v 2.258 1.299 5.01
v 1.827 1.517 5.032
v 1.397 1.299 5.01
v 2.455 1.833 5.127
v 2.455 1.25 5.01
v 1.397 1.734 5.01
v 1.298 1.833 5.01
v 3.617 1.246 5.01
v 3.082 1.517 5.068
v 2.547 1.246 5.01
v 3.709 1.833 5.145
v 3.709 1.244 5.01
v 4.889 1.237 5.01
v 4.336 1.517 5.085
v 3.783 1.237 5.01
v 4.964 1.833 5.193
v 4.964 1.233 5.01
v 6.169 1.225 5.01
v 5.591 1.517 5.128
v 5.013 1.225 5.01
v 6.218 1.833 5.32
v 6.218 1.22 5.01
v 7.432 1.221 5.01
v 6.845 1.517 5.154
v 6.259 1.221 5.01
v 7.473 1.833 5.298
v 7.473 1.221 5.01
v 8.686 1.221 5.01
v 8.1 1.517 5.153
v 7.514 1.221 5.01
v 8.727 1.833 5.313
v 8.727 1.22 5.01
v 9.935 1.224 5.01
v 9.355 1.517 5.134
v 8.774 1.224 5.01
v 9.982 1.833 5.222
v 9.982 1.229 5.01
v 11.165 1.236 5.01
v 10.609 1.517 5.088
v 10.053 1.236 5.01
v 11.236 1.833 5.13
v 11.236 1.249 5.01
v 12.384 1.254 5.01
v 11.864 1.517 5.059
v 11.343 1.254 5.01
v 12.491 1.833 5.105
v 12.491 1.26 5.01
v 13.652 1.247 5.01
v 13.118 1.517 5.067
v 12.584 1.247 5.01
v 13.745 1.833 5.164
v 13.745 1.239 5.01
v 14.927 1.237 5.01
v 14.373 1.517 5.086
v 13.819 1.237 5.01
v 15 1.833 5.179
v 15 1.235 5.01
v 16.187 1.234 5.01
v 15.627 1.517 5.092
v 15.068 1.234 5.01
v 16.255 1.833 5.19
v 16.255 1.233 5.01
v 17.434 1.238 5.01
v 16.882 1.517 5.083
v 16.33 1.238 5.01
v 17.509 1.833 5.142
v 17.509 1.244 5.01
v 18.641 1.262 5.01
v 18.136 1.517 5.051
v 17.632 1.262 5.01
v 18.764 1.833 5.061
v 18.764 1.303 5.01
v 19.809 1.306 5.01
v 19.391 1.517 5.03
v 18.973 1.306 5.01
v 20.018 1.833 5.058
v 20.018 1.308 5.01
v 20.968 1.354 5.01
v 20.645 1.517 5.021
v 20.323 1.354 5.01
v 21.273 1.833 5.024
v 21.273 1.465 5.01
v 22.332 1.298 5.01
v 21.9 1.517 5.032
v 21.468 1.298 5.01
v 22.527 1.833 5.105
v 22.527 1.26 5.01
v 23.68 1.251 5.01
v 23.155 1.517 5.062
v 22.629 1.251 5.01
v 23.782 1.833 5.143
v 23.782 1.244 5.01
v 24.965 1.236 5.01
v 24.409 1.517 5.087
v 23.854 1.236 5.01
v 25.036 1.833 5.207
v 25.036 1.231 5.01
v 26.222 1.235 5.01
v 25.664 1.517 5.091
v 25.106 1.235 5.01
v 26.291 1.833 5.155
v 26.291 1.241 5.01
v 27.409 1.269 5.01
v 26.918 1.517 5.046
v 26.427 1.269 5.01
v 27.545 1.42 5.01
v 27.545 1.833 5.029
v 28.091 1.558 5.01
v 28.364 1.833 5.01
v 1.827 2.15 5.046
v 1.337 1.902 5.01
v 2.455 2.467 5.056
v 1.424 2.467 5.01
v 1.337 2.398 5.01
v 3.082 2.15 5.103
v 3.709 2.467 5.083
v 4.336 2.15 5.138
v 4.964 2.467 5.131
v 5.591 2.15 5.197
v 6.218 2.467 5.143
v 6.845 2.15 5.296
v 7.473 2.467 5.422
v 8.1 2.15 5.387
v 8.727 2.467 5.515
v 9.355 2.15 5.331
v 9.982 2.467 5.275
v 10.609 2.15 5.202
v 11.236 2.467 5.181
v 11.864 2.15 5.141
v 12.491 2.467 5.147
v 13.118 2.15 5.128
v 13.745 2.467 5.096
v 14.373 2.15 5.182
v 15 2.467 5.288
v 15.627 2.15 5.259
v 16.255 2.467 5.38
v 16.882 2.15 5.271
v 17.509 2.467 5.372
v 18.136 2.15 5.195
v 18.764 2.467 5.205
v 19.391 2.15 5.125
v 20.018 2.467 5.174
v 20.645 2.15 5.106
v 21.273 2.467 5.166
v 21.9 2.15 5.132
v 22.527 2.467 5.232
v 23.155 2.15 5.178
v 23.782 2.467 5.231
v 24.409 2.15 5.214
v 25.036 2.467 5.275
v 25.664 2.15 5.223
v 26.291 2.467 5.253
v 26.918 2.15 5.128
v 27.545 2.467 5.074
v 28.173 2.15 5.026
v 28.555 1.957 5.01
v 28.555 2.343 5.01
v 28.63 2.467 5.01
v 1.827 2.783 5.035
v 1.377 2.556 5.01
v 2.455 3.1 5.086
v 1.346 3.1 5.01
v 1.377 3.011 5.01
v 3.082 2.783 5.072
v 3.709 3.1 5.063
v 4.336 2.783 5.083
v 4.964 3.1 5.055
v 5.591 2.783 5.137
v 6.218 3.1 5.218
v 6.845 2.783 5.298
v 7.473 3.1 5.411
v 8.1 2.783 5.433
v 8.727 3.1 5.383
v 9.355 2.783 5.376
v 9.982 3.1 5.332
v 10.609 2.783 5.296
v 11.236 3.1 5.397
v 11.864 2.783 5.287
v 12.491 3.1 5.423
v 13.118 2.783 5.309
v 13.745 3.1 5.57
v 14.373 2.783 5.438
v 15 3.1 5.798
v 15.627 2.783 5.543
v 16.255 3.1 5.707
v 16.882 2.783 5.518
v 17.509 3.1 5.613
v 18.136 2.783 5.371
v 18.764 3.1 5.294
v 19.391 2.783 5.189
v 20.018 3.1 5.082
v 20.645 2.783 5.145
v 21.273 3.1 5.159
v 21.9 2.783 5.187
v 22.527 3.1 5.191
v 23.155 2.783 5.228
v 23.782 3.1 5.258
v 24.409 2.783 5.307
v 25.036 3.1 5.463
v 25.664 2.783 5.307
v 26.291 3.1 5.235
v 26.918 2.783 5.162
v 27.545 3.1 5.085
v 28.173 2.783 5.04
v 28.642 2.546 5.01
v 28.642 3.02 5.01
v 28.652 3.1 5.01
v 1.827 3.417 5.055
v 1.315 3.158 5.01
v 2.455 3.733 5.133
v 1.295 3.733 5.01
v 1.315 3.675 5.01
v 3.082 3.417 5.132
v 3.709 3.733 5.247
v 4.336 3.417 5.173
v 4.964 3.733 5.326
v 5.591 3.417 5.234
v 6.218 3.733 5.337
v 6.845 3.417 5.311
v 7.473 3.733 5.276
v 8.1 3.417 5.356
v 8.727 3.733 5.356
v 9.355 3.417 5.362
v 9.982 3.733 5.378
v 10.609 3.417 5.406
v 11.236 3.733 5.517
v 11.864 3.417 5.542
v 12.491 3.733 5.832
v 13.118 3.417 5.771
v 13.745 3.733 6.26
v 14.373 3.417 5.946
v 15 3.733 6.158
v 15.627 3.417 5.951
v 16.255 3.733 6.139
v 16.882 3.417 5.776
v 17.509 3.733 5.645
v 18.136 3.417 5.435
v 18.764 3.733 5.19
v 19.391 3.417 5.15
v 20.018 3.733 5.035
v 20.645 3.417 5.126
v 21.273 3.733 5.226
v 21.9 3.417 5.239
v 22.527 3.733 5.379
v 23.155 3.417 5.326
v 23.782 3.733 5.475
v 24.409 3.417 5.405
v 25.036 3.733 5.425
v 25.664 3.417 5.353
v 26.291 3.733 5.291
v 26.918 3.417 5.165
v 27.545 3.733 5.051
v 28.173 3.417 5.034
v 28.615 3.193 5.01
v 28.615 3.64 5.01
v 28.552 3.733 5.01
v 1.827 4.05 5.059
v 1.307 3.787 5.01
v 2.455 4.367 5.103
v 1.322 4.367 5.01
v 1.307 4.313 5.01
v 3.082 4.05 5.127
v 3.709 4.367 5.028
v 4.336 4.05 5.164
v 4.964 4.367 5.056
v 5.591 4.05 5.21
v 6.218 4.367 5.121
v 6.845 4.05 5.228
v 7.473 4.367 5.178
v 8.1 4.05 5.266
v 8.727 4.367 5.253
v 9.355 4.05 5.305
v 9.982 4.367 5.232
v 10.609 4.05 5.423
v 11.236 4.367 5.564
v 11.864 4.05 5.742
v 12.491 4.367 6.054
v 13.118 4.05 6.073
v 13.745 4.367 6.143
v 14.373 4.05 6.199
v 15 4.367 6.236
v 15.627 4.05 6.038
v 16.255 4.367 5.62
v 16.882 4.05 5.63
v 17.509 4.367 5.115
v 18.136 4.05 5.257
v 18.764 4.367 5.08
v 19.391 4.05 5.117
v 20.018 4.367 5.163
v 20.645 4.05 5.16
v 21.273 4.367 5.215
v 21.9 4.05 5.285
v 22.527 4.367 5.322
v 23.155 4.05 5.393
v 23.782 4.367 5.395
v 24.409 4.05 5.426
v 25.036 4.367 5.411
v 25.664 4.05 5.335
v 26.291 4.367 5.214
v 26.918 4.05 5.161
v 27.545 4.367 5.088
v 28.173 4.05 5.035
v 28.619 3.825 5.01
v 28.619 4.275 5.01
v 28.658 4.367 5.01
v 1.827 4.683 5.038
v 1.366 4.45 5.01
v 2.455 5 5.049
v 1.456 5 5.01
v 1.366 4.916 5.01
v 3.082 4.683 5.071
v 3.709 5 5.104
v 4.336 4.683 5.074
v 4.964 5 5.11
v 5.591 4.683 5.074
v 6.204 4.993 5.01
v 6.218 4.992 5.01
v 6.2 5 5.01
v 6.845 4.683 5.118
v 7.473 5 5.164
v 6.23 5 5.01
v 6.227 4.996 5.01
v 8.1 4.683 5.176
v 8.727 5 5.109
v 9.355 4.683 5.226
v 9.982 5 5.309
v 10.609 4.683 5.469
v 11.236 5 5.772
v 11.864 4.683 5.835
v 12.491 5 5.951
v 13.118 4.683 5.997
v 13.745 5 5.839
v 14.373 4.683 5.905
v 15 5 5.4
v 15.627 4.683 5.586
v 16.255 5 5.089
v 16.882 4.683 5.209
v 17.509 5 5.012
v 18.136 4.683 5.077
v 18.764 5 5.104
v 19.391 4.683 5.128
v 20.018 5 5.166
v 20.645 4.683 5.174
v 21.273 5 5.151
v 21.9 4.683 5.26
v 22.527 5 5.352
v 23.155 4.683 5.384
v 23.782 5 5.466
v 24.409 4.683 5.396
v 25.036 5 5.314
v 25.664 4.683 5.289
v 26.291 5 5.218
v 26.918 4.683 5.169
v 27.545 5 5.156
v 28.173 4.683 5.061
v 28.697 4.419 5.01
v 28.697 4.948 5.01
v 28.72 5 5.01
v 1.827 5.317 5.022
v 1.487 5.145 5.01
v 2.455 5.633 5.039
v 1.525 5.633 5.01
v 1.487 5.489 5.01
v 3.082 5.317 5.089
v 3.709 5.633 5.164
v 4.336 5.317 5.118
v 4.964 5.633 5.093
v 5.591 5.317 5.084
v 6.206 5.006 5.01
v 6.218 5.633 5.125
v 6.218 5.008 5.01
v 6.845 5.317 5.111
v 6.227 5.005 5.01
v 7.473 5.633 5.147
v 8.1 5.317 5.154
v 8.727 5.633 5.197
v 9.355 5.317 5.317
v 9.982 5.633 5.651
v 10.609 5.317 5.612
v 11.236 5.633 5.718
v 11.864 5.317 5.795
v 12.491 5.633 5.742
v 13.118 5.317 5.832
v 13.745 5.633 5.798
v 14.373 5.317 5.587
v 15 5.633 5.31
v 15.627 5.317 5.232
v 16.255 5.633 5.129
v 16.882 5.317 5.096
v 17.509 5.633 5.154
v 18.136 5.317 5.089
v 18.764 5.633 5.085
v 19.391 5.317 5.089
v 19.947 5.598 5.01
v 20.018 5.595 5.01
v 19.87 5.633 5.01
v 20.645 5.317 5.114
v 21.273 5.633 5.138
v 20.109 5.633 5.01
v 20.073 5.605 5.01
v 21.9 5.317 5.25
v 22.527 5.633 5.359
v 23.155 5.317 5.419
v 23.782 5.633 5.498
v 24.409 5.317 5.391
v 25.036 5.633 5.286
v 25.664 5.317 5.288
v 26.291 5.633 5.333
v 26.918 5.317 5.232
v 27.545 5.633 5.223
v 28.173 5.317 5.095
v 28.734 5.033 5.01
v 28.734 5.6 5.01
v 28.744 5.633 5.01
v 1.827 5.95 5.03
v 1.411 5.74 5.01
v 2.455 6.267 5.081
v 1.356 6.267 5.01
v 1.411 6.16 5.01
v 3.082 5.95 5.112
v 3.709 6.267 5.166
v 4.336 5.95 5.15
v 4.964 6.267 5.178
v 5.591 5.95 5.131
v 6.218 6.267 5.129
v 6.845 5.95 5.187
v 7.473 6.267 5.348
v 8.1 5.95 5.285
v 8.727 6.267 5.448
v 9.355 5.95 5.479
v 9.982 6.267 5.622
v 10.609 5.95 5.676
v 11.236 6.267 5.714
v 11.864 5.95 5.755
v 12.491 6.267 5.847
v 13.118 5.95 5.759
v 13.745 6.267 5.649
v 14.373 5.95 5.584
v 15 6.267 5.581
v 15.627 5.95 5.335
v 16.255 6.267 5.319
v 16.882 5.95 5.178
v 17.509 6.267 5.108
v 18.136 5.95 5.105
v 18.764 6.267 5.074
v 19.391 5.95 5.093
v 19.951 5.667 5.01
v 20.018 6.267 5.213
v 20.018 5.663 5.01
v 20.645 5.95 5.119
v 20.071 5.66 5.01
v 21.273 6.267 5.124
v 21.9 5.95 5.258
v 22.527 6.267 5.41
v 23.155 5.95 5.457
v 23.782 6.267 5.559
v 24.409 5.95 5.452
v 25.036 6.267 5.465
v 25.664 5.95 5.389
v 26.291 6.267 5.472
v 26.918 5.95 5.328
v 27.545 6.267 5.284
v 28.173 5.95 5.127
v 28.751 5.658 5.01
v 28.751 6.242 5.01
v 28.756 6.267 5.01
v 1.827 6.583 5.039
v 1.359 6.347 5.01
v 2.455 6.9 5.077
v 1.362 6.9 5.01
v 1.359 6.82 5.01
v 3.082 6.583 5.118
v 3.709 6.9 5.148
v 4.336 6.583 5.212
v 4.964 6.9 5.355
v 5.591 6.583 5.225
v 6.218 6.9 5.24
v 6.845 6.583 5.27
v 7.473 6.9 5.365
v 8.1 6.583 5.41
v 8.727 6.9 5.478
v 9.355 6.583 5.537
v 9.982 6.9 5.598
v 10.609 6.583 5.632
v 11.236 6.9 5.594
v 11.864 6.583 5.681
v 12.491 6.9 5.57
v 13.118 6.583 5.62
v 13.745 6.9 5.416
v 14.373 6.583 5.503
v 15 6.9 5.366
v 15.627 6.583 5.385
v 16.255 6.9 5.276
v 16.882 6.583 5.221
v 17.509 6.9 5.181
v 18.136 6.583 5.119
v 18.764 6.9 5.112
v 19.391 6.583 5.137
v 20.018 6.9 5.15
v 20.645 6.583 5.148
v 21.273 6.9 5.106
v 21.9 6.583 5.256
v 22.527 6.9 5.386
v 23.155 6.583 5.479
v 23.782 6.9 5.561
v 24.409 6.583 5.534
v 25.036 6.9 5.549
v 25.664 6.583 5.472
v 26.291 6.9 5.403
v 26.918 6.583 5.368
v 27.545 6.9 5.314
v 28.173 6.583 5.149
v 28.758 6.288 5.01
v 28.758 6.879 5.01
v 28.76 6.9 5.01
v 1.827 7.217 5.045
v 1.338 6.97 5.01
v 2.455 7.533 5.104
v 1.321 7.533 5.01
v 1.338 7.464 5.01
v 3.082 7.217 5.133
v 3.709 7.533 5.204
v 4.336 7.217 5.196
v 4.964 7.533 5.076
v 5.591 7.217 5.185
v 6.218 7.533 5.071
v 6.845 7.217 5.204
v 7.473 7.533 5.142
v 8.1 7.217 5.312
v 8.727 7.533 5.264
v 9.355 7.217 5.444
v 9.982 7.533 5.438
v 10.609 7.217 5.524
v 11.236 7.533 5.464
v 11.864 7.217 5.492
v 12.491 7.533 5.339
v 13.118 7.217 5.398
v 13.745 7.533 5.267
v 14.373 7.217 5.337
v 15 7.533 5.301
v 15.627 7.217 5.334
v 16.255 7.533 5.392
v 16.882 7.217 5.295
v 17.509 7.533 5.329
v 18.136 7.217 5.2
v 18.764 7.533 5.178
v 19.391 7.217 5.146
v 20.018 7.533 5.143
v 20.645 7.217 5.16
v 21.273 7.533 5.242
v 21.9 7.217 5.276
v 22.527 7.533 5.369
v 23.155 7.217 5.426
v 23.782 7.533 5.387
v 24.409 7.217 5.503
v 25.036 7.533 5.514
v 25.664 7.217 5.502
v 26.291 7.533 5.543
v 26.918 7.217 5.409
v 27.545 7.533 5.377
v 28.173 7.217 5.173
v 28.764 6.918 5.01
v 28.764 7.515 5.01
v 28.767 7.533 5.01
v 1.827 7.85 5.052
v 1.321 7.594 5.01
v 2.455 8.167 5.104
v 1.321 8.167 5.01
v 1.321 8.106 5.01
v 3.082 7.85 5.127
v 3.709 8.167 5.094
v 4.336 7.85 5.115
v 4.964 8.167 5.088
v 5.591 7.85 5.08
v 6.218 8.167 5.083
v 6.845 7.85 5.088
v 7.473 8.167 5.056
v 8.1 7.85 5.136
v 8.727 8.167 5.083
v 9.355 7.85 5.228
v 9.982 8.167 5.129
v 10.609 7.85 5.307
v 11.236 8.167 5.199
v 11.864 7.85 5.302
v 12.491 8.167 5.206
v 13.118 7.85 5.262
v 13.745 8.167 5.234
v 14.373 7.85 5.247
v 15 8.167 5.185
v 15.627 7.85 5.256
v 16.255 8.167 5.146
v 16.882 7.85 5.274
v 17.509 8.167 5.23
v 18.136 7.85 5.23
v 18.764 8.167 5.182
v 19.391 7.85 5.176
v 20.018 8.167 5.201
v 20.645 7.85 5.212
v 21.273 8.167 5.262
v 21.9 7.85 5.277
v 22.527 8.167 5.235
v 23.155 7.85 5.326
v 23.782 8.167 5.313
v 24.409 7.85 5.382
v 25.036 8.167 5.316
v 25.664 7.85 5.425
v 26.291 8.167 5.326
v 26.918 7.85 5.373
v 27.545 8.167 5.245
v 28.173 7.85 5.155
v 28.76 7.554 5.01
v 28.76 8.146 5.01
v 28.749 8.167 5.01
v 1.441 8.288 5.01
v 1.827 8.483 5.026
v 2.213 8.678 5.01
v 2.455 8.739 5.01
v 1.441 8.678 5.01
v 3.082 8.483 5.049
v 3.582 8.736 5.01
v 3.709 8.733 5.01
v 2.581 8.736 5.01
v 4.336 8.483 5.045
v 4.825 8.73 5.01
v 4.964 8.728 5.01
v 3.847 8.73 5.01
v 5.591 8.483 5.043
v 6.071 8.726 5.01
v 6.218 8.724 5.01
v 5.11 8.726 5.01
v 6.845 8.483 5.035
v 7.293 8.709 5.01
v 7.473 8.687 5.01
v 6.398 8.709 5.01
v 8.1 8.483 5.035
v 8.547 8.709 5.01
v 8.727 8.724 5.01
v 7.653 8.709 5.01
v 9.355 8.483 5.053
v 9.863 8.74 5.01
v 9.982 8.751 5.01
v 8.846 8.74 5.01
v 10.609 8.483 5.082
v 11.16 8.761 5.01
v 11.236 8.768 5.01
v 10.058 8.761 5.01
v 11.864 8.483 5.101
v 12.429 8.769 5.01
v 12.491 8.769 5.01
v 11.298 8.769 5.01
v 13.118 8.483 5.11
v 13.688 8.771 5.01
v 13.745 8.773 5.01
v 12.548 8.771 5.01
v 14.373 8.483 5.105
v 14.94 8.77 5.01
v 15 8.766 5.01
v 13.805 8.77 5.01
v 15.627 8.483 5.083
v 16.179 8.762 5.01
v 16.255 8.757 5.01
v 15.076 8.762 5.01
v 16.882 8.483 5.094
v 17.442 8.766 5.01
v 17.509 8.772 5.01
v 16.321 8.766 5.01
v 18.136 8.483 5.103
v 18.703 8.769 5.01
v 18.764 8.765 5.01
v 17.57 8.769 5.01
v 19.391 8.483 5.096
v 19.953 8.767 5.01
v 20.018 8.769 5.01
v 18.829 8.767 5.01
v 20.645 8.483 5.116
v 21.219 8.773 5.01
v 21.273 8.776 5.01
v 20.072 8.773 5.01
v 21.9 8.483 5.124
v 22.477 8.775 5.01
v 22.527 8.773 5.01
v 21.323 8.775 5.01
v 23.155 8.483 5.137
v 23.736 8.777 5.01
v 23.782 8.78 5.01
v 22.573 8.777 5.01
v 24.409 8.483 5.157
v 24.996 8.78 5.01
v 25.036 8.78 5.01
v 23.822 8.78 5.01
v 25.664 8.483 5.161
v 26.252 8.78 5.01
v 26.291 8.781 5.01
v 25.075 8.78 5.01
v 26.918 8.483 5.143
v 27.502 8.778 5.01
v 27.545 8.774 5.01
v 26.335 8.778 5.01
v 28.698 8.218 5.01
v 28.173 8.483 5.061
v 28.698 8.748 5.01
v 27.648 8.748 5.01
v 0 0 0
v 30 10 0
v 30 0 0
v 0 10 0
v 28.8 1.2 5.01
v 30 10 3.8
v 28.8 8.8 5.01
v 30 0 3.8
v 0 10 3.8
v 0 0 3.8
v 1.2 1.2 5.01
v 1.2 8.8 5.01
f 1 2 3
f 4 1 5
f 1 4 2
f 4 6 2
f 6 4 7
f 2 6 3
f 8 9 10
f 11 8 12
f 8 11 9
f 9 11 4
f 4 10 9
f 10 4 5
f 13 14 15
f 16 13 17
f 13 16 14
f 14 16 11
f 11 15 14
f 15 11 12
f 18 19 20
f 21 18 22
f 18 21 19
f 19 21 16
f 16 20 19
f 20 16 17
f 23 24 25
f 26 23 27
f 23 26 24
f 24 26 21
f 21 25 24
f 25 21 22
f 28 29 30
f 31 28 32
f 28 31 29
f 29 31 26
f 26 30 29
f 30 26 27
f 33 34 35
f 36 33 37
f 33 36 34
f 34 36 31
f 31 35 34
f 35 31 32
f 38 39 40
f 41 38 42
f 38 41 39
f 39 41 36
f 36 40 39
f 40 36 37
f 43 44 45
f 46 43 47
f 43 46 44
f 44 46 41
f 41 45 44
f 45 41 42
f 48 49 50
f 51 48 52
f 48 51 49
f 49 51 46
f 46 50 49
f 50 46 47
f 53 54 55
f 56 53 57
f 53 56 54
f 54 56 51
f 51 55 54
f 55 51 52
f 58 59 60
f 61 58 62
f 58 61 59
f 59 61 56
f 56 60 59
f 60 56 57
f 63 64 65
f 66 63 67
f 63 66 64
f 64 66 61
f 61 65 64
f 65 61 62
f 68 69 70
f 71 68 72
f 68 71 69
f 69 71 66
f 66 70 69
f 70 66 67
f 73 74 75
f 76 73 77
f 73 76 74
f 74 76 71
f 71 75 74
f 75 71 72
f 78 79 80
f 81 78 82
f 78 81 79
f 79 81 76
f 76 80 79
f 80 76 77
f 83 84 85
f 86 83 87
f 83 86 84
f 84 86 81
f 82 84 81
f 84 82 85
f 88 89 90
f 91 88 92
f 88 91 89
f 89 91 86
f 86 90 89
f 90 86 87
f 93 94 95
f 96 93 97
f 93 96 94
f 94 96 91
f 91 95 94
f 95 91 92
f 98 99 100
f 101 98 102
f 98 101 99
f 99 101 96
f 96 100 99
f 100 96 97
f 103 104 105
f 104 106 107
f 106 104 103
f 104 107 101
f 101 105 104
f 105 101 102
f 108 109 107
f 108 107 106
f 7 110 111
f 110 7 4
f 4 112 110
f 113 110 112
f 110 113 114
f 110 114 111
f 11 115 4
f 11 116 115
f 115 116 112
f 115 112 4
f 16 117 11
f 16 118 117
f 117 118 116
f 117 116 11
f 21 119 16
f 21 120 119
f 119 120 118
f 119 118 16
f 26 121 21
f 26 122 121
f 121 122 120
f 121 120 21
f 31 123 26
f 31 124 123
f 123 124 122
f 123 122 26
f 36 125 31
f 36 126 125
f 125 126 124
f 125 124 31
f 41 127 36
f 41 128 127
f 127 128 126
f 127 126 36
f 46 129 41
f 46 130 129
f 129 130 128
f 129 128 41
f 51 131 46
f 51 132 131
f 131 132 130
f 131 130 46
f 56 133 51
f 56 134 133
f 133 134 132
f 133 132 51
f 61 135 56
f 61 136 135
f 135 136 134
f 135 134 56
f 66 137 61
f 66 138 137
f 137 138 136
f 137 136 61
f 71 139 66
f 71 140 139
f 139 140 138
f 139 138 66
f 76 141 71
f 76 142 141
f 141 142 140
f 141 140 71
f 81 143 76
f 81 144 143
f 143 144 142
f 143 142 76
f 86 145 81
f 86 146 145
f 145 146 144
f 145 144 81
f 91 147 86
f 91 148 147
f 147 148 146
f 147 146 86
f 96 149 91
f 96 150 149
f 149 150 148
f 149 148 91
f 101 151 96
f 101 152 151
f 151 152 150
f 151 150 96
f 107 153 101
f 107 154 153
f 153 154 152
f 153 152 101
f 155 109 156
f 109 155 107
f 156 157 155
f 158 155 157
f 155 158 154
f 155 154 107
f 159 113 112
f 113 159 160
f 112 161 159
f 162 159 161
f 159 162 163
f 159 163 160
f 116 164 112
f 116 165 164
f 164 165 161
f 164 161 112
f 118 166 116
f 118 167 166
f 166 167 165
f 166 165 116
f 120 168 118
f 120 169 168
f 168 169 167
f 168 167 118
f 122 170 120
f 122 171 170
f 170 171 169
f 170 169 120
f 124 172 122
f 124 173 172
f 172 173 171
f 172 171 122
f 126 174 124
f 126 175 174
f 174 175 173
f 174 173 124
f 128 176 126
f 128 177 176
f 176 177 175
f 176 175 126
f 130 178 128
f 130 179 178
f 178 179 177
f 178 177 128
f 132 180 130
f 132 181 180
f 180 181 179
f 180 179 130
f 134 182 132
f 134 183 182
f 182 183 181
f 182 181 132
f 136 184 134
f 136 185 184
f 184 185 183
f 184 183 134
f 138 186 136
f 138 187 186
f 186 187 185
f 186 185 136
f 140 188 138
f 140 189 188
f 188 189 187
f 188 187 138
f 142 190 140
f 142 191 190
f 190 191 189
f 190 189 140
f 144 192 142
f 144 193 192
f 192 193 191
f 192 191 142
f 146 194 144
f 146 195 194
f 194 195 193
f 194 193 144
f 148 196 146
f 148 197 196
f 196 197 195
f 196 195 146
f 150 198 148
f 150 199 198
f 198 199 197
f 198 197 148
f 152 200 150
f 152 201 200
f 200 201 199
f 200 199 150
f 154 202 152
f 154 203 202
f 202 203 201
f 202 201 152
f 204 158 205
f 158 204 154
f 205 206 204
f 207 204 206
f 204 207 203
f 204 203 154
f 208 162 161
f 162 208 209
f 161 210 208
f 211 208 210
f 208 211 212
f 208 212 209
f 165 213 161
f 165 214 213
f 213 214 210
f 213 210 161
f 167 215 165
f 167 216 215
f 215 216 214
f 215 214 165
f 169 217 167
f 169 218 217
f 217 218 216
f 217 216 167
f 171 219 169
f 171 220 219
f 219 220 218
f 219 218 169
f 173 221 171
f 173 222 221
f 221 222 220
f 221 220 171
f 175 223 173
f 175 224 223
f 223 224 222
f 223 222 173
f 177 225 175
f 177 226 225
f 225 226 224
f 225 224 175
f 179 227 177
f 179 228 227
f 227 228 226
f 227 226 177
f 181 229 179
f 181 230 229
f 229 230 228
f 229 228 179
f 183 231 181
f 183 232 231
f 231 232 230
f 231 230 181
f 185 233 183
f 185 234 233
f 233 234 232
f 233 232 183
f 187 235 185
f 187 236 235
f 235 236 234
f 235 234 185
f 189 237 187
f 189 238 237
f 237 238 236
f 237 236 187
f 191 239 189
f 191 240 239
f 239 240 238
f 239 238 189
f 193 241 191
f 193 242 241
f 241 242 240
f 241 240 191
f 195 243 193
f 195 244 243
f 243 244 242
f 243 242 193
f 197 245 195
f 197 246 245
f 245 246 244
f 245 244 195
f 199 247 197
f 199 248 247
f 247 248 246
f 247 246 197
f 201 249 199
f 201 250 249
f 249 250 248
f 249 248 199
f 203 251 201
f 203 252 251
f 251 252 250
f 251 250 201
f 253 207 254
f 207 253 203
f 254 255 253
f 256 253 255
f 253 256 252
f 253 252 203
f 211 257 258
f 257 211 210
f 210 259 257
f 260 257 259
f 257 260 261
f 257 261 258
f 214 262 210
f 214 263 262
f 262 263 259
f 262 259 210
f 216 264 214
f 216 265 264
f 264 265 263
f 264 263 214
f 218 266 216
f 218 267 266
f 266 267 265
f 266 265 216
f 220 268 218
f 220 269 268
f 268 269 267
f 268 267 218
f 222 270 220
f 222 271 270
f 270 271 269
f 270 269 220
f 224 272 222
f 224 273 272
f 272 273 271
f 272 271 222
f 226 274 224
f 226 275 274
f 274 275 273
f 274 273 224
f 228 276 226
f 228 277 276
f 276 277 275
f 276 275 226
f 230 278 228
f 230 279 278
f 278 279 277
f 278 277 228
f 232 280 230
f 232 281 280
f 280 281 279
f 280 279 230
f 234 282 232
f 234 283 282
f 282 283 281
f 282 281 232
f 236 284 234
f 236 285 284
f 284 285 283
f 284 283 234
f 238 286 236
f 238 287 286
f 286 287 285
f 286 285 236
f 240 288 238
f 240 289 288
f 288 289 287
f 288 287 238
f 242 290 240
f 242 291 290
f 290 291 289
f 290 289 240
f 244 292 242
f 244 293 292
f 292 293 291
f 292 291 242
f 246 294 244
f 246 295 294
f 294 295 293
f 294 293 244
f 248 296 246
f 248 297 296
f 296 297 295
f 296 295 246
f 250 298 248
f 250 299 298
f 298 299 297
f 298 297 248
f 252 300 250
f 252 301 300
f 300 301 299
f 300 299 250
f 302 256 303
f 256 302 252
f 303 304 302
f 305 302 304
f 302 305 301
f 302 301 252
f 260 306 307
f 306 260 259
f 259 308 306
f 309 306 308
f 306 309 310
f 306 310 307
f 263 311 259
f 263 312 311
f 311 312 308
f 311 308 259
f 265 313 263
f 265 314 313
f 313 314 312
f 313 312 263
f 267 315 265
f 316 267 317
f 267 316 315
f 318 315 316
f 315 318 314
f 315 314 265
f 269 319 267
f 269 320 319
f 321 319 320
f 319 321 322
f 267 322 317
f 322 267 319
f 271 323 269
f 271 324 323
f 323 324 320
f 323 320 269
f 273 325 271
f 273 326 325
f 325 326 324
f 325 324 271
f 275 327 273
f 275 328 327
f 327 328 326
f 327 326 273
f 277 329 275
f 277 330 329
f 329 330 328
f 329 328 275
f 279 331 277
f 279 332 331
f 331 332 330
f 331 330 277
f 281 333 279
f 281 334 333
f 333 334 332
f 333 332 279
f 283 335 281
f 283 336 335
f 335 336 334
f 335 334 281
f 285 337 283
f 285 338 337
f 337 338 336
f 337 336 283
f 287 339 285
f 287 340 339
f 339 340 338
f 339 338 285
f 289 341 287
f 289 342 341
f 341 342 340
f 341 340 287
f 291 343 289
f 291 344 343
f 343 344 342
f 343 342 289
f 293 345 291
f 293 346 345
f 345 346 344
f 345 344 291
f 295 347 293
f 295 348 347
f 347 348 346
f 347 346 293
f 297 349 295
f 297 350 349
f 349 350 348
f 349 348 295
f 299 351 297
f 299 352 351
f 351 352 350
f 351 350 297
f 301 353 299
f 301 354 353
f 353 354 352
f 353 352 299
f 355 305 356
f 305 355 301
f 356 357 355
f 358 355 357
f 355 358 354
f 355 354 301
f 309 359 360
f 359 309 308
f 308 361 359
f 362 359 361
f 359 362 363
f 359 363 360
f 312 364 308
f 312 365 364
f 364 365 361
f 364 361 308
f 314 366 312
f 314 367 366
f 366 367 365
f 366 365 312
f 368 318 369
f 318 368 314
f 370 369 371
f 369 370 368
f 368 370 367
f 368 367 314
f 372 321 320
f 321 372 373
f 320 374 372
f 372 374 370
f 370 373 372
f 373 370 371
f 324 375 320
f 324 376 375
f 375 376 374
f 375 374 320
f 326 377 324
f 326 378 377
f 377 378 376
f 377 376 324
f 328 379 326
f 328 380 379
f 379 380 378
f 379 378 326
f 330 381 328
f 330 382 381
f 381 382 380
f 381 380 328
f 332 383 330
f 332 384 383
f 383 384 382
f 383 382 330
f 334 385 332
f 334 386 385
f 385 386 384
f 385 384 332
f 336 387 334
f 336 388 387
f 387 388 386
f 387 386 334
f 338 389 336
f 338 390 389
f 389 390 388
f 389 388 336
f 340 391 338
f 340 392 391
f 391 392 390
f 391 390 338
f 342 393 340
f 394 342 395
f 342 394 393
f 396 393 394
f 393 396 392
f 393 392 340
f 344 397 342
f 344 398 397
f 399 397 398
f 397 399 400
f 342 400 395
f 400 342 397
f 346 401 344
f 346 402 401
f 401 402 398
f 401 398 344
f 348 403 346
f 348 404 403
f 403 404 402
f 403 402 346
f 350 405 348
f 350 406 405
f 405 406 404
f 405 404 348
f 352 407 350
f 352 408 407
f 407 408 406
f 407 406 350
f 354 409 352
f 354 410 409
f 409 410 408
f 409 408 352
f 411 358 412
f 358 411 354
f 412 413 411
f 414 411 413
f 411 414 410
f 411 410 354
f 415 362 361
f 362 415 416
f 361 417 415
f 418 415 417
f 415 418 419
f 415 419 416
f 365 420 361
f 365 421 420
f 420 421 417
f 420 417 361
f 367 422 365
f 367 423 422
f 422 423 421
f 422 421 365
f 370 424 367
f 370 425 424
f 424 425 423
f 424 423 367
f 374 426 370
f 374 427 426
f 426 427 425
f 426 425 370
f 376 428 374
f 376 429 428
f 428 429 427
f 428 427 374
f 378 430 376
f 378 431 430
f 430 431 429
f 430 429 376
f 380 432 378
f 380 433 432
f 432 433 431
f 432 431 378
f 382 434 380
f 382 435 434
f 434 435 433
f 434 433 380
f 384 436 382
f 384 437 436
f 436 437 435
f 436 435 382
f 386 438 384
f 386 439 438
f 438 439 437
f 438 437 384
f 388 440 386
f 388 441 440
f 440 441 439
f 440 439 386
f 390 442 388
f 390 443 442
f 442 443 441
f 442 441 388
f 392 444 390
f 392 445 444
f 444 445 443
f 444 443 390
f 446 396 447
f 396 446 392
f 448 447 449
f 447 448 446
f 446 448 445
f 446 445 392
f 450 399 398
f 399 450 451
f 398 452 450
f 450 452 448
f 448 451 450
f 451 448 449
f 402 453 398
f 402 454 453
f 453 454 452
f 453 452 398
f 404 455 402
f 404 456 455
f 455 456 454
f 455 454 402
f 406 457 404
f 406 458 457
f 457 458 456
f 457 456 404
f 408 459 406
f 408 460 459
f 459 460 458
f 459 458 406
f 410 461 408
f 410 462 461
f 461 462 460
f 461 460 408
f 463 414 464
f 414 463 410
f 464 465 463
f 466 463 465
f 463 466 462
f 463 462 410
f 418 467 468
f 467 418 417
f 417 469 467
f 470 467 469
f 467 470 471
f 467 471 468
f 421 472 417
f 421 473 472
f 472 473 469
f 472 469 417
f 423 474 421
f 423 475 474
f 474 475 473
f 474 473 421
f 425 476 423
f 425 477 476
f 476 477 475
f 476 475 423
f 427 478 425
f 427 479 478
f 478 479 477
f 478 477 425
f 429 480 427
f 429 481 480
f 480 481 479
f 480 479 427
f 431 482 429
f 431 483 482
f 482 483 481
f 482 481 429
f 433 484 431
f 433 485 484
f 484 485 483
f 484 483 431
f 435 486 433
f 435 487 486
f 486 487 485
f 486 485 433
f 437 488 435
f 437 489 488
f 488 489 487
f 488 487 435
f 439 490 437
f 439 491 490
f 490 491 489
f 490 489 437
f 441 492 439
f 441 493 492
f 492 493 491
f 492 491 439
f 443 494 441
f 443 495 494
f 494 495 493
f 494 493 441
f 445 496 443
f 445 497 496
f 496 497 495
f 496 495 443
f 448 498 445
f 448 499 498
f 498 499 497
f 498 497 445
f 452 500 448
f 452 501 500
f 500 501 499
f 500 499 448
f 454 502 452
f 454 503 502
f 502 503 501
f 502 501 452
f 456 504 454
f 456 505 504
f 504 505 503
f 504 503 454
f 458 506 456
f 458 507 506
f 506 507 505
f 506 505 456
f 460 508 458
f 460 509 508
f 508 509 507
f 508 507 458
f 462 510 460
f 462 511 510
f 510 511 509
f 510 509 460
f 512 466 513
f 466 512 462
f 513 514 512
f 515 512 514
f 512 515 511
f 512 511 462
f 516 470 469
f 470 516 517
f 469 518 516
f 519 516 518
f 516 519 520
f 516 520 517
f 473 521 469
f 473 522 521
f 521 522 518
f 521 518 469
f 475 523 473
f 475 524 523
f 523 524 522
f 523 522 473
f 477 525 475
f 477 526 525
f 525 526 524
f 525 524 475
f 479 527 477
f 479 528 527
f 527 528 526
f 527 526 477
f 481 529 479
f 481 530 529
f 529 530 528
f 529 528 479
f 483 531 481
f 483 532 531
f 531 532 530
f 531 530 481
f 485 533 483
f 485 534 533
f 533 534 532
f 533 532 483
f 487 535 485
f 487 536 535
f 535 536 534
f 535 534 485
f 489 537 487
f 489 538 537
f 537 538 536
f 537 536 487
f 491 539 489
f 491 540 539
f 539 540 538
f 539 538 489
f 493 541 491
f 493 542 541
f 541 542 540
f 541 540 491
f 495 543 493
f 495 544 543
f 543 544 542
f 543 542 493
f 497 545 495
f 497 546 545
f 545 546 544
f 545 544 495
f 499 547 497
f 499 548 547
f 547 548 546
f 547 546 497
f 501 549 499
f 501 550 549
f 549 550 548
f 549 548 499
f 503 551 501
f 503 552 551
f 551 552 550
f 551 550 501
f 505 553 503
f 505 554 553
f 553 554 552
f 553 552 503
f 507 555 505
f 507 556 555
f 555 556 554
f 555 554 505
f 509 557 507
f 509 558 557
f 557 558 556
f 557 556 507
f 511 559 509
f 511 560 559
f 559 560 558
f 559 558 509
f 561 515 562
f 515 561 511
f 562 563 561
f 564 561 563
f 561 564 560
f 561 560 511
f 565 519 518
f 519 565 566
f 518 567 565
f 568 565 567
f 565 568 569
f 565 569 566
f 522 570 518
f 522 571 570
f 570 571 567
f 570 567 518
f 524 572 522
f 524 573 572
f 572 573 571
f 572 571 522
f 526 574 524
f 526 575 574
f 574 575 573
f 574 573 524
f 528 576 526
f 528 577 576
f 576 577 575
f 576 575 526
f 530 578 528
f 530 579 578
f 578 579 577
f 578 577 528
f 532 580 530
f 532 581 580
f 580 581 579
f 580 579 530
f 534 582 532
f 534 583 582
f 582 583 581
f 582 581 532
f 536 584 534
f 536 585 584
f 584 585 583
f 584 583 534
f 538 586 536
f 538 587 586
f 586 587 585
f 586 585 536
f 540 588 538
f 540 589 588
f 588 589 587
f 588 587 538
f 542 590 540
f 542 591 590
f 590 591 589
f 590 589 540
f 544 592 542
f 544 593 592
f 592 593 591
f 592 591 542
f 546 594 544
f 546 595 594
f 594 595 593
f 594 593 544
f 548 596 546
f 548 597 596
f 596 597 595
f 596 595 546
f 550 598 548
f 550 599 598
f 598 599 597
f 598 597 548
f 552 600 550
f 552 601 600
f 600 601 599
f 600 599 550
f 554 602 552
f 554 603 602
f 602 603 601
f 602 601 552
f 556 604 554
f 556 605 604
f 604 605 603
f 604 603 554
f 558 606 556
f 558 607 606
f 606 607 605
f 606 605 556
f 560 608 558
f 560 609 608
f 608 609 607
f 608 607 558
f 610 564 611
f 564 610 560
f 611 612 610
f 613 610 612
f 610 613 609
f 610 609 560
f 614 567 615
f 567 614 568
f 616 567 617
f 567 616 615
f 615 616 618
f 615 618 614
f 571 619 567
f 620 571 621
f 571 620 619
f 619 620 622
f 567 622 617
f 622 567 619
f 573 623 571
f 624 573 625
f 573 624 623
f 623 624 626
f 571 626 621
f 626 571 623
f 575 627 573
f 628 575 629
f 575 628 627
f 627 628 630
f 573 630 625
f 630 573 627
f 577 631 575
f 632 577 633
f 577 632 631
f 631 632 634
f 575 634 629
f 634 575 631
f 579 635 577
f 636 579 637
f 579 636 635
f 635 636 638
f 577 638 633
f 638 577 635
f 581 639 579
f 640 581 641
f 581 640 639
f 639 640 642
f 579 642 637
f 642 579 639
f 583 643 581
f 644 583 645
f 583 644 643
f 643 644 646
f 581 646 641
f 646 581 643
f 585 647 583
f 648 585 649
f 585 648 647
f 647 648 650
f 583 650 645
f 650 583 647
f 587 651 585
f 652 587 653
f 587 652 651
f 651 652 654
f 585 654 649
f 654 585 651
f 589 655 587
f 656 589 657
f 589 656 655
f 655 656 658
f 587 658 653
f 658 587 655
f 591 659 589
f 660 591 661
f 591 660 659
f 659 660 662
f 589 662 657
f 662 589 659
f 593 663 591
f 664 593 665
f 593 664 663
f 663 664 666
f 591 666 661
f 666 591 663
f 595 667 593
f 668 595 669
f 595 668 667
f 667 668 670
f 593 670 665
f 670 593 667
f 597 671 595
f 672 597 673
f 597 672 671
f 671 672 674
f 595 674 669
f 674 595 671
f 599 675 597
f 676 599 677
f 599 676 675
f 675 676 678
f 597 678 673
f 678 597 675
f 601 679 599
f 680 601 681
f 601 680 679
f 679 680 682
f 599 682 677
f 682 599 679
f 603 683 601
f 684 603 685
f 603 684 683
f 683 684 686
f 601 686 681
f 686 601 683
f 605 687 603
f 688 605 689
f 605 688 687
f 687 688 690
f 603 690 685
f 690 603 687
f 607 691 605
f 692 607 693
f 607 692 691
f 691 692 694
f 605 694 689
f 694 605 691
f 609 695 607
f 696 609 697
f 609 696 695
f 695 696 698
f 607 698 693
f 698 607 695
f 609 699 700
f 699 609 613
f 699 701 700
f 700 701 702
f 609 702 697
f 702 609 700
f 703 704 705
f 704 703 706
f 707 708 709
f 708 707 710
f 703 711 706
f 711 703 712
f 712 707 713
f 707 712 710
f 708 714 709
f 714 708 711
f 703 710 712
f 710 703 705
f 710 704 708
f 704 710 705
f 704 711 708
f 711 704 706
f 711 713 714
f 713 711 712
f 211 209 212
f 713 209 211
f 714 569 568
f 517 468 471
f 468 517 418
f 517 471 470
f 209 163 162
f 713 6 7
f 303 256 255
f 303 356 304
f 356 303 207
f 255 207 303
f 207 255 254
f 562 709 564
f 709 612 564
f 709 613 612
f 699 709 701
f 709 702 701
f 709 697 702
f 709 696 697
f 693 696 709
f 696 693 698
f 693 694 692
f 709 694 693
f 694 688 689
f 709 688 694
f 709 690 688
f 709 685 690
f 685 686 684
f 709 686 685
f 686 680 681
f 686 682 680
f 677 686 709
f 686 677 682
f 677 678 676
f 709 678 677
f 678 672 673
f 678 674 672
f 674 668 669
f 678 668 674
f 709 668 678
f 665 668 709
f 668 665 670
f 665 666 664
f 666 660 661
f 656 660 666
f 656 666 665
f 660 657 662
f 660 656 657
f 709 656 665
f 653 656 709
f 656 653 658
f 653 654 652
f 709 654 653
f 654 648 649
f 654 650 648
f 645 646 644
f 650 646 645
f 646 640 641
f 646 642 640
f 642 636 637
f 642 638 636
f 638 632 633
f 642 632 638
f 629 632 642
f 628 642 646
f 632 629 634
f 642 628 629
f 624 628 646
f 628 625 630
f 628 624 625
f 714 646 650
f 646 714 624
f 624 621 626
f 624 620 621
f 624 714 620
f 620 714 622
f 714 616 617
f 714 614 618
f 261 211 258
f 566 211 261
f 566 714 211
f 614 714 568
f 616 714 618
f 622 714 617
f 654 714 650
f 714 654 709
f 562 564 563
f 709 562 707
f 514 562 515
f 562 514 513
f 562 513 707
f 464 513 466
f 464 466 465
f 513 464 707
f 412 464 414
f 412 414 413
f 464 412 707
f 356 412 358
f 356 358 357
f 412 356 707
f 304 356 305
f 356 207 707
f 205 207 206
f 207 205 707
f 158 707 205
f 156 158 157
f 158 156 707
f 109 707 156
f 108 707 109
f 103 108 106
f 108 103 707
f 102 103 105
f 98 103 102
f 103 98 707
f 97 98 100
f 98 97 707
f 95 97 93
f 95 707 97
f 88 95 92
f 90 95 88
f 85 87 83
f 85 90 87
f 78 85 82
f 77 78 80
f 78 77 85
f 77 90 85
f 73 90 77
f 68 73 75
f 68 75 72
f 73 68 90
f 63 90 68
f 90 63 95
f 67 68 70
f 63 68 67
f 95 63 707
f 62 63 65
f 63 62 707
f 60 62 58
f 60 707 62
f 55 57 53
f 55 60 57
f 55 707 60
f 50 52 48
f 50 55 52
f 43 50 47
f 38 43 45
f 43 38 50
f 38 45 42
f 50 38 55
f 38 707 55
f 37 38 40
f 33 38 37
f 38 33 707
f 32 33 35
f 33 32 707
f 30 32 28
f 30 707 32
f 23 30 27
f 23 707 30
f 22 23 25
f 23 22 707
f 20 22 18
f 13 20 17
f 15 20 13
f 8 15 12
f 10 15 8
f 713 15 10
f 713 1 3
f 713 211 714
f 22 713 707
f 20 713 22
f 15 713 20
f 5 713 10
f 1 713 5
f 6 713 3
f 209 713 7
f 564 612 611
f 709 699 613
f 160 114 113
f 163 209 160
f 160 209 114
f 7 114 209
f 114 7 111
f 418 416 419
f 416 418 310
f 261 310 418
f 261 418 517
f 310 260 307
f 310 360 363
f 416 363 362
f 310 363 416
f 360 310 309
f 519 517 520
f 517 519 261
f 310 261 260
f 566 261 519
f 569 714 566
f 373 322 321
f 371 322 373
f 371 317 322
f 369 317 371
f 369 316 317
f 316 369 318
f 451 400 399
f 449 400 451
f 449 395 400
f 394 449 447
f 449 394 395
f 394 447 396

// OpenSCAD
eps = 0.01;

module brick(width, height, depth, surface, bumpiness = 0.5, camph = 1.2) {
    translate([camph, camph, depth])
    scale([(width - 2*camph)/22, (height - 2*camph)/12, bumpiness])
    surface(surface);

    polyhedron(
        points = [
            [ 0,     0,     0 ],
            [ width, 0,     0 ],
            [ width, height, 0 ],
            [ 0,     height, 0 ],

            [ 0,     0,      depth - camph ],
            [ width, 0,      depth - camph ],
            [ width, height, depth - camph ],
            [ 0,     height, depth - camph ],

            [ camph,         camph,          depth + eps ],
            [ width - camph, camph,          depth + eps ],
            [ width - camph, height - camph, depth + eps ],
            [ camph,         height - camph, depth + eps ]
        ],
        faces = [
            [ 0, 1, 2, 3 ],

            [ 0, 4, 5, 1 ],
            [ 1, 5, 6, 2 ],

            [ 2, 6, 7, 3 ],
            [ 3, 7, 4, 0 ],

            [ 4, 8, 9, 5 ],
            [ 5, 9, 10, 6 ],
            [ 6, 10, 11, 7 ],
            [ 7, 11, 8, 4 ],

            [ 8, 11, 10, 9 ]
        ],
        convexity = 10
    );
}

brick(30, 10, 5, "surfaces/1.txt");
